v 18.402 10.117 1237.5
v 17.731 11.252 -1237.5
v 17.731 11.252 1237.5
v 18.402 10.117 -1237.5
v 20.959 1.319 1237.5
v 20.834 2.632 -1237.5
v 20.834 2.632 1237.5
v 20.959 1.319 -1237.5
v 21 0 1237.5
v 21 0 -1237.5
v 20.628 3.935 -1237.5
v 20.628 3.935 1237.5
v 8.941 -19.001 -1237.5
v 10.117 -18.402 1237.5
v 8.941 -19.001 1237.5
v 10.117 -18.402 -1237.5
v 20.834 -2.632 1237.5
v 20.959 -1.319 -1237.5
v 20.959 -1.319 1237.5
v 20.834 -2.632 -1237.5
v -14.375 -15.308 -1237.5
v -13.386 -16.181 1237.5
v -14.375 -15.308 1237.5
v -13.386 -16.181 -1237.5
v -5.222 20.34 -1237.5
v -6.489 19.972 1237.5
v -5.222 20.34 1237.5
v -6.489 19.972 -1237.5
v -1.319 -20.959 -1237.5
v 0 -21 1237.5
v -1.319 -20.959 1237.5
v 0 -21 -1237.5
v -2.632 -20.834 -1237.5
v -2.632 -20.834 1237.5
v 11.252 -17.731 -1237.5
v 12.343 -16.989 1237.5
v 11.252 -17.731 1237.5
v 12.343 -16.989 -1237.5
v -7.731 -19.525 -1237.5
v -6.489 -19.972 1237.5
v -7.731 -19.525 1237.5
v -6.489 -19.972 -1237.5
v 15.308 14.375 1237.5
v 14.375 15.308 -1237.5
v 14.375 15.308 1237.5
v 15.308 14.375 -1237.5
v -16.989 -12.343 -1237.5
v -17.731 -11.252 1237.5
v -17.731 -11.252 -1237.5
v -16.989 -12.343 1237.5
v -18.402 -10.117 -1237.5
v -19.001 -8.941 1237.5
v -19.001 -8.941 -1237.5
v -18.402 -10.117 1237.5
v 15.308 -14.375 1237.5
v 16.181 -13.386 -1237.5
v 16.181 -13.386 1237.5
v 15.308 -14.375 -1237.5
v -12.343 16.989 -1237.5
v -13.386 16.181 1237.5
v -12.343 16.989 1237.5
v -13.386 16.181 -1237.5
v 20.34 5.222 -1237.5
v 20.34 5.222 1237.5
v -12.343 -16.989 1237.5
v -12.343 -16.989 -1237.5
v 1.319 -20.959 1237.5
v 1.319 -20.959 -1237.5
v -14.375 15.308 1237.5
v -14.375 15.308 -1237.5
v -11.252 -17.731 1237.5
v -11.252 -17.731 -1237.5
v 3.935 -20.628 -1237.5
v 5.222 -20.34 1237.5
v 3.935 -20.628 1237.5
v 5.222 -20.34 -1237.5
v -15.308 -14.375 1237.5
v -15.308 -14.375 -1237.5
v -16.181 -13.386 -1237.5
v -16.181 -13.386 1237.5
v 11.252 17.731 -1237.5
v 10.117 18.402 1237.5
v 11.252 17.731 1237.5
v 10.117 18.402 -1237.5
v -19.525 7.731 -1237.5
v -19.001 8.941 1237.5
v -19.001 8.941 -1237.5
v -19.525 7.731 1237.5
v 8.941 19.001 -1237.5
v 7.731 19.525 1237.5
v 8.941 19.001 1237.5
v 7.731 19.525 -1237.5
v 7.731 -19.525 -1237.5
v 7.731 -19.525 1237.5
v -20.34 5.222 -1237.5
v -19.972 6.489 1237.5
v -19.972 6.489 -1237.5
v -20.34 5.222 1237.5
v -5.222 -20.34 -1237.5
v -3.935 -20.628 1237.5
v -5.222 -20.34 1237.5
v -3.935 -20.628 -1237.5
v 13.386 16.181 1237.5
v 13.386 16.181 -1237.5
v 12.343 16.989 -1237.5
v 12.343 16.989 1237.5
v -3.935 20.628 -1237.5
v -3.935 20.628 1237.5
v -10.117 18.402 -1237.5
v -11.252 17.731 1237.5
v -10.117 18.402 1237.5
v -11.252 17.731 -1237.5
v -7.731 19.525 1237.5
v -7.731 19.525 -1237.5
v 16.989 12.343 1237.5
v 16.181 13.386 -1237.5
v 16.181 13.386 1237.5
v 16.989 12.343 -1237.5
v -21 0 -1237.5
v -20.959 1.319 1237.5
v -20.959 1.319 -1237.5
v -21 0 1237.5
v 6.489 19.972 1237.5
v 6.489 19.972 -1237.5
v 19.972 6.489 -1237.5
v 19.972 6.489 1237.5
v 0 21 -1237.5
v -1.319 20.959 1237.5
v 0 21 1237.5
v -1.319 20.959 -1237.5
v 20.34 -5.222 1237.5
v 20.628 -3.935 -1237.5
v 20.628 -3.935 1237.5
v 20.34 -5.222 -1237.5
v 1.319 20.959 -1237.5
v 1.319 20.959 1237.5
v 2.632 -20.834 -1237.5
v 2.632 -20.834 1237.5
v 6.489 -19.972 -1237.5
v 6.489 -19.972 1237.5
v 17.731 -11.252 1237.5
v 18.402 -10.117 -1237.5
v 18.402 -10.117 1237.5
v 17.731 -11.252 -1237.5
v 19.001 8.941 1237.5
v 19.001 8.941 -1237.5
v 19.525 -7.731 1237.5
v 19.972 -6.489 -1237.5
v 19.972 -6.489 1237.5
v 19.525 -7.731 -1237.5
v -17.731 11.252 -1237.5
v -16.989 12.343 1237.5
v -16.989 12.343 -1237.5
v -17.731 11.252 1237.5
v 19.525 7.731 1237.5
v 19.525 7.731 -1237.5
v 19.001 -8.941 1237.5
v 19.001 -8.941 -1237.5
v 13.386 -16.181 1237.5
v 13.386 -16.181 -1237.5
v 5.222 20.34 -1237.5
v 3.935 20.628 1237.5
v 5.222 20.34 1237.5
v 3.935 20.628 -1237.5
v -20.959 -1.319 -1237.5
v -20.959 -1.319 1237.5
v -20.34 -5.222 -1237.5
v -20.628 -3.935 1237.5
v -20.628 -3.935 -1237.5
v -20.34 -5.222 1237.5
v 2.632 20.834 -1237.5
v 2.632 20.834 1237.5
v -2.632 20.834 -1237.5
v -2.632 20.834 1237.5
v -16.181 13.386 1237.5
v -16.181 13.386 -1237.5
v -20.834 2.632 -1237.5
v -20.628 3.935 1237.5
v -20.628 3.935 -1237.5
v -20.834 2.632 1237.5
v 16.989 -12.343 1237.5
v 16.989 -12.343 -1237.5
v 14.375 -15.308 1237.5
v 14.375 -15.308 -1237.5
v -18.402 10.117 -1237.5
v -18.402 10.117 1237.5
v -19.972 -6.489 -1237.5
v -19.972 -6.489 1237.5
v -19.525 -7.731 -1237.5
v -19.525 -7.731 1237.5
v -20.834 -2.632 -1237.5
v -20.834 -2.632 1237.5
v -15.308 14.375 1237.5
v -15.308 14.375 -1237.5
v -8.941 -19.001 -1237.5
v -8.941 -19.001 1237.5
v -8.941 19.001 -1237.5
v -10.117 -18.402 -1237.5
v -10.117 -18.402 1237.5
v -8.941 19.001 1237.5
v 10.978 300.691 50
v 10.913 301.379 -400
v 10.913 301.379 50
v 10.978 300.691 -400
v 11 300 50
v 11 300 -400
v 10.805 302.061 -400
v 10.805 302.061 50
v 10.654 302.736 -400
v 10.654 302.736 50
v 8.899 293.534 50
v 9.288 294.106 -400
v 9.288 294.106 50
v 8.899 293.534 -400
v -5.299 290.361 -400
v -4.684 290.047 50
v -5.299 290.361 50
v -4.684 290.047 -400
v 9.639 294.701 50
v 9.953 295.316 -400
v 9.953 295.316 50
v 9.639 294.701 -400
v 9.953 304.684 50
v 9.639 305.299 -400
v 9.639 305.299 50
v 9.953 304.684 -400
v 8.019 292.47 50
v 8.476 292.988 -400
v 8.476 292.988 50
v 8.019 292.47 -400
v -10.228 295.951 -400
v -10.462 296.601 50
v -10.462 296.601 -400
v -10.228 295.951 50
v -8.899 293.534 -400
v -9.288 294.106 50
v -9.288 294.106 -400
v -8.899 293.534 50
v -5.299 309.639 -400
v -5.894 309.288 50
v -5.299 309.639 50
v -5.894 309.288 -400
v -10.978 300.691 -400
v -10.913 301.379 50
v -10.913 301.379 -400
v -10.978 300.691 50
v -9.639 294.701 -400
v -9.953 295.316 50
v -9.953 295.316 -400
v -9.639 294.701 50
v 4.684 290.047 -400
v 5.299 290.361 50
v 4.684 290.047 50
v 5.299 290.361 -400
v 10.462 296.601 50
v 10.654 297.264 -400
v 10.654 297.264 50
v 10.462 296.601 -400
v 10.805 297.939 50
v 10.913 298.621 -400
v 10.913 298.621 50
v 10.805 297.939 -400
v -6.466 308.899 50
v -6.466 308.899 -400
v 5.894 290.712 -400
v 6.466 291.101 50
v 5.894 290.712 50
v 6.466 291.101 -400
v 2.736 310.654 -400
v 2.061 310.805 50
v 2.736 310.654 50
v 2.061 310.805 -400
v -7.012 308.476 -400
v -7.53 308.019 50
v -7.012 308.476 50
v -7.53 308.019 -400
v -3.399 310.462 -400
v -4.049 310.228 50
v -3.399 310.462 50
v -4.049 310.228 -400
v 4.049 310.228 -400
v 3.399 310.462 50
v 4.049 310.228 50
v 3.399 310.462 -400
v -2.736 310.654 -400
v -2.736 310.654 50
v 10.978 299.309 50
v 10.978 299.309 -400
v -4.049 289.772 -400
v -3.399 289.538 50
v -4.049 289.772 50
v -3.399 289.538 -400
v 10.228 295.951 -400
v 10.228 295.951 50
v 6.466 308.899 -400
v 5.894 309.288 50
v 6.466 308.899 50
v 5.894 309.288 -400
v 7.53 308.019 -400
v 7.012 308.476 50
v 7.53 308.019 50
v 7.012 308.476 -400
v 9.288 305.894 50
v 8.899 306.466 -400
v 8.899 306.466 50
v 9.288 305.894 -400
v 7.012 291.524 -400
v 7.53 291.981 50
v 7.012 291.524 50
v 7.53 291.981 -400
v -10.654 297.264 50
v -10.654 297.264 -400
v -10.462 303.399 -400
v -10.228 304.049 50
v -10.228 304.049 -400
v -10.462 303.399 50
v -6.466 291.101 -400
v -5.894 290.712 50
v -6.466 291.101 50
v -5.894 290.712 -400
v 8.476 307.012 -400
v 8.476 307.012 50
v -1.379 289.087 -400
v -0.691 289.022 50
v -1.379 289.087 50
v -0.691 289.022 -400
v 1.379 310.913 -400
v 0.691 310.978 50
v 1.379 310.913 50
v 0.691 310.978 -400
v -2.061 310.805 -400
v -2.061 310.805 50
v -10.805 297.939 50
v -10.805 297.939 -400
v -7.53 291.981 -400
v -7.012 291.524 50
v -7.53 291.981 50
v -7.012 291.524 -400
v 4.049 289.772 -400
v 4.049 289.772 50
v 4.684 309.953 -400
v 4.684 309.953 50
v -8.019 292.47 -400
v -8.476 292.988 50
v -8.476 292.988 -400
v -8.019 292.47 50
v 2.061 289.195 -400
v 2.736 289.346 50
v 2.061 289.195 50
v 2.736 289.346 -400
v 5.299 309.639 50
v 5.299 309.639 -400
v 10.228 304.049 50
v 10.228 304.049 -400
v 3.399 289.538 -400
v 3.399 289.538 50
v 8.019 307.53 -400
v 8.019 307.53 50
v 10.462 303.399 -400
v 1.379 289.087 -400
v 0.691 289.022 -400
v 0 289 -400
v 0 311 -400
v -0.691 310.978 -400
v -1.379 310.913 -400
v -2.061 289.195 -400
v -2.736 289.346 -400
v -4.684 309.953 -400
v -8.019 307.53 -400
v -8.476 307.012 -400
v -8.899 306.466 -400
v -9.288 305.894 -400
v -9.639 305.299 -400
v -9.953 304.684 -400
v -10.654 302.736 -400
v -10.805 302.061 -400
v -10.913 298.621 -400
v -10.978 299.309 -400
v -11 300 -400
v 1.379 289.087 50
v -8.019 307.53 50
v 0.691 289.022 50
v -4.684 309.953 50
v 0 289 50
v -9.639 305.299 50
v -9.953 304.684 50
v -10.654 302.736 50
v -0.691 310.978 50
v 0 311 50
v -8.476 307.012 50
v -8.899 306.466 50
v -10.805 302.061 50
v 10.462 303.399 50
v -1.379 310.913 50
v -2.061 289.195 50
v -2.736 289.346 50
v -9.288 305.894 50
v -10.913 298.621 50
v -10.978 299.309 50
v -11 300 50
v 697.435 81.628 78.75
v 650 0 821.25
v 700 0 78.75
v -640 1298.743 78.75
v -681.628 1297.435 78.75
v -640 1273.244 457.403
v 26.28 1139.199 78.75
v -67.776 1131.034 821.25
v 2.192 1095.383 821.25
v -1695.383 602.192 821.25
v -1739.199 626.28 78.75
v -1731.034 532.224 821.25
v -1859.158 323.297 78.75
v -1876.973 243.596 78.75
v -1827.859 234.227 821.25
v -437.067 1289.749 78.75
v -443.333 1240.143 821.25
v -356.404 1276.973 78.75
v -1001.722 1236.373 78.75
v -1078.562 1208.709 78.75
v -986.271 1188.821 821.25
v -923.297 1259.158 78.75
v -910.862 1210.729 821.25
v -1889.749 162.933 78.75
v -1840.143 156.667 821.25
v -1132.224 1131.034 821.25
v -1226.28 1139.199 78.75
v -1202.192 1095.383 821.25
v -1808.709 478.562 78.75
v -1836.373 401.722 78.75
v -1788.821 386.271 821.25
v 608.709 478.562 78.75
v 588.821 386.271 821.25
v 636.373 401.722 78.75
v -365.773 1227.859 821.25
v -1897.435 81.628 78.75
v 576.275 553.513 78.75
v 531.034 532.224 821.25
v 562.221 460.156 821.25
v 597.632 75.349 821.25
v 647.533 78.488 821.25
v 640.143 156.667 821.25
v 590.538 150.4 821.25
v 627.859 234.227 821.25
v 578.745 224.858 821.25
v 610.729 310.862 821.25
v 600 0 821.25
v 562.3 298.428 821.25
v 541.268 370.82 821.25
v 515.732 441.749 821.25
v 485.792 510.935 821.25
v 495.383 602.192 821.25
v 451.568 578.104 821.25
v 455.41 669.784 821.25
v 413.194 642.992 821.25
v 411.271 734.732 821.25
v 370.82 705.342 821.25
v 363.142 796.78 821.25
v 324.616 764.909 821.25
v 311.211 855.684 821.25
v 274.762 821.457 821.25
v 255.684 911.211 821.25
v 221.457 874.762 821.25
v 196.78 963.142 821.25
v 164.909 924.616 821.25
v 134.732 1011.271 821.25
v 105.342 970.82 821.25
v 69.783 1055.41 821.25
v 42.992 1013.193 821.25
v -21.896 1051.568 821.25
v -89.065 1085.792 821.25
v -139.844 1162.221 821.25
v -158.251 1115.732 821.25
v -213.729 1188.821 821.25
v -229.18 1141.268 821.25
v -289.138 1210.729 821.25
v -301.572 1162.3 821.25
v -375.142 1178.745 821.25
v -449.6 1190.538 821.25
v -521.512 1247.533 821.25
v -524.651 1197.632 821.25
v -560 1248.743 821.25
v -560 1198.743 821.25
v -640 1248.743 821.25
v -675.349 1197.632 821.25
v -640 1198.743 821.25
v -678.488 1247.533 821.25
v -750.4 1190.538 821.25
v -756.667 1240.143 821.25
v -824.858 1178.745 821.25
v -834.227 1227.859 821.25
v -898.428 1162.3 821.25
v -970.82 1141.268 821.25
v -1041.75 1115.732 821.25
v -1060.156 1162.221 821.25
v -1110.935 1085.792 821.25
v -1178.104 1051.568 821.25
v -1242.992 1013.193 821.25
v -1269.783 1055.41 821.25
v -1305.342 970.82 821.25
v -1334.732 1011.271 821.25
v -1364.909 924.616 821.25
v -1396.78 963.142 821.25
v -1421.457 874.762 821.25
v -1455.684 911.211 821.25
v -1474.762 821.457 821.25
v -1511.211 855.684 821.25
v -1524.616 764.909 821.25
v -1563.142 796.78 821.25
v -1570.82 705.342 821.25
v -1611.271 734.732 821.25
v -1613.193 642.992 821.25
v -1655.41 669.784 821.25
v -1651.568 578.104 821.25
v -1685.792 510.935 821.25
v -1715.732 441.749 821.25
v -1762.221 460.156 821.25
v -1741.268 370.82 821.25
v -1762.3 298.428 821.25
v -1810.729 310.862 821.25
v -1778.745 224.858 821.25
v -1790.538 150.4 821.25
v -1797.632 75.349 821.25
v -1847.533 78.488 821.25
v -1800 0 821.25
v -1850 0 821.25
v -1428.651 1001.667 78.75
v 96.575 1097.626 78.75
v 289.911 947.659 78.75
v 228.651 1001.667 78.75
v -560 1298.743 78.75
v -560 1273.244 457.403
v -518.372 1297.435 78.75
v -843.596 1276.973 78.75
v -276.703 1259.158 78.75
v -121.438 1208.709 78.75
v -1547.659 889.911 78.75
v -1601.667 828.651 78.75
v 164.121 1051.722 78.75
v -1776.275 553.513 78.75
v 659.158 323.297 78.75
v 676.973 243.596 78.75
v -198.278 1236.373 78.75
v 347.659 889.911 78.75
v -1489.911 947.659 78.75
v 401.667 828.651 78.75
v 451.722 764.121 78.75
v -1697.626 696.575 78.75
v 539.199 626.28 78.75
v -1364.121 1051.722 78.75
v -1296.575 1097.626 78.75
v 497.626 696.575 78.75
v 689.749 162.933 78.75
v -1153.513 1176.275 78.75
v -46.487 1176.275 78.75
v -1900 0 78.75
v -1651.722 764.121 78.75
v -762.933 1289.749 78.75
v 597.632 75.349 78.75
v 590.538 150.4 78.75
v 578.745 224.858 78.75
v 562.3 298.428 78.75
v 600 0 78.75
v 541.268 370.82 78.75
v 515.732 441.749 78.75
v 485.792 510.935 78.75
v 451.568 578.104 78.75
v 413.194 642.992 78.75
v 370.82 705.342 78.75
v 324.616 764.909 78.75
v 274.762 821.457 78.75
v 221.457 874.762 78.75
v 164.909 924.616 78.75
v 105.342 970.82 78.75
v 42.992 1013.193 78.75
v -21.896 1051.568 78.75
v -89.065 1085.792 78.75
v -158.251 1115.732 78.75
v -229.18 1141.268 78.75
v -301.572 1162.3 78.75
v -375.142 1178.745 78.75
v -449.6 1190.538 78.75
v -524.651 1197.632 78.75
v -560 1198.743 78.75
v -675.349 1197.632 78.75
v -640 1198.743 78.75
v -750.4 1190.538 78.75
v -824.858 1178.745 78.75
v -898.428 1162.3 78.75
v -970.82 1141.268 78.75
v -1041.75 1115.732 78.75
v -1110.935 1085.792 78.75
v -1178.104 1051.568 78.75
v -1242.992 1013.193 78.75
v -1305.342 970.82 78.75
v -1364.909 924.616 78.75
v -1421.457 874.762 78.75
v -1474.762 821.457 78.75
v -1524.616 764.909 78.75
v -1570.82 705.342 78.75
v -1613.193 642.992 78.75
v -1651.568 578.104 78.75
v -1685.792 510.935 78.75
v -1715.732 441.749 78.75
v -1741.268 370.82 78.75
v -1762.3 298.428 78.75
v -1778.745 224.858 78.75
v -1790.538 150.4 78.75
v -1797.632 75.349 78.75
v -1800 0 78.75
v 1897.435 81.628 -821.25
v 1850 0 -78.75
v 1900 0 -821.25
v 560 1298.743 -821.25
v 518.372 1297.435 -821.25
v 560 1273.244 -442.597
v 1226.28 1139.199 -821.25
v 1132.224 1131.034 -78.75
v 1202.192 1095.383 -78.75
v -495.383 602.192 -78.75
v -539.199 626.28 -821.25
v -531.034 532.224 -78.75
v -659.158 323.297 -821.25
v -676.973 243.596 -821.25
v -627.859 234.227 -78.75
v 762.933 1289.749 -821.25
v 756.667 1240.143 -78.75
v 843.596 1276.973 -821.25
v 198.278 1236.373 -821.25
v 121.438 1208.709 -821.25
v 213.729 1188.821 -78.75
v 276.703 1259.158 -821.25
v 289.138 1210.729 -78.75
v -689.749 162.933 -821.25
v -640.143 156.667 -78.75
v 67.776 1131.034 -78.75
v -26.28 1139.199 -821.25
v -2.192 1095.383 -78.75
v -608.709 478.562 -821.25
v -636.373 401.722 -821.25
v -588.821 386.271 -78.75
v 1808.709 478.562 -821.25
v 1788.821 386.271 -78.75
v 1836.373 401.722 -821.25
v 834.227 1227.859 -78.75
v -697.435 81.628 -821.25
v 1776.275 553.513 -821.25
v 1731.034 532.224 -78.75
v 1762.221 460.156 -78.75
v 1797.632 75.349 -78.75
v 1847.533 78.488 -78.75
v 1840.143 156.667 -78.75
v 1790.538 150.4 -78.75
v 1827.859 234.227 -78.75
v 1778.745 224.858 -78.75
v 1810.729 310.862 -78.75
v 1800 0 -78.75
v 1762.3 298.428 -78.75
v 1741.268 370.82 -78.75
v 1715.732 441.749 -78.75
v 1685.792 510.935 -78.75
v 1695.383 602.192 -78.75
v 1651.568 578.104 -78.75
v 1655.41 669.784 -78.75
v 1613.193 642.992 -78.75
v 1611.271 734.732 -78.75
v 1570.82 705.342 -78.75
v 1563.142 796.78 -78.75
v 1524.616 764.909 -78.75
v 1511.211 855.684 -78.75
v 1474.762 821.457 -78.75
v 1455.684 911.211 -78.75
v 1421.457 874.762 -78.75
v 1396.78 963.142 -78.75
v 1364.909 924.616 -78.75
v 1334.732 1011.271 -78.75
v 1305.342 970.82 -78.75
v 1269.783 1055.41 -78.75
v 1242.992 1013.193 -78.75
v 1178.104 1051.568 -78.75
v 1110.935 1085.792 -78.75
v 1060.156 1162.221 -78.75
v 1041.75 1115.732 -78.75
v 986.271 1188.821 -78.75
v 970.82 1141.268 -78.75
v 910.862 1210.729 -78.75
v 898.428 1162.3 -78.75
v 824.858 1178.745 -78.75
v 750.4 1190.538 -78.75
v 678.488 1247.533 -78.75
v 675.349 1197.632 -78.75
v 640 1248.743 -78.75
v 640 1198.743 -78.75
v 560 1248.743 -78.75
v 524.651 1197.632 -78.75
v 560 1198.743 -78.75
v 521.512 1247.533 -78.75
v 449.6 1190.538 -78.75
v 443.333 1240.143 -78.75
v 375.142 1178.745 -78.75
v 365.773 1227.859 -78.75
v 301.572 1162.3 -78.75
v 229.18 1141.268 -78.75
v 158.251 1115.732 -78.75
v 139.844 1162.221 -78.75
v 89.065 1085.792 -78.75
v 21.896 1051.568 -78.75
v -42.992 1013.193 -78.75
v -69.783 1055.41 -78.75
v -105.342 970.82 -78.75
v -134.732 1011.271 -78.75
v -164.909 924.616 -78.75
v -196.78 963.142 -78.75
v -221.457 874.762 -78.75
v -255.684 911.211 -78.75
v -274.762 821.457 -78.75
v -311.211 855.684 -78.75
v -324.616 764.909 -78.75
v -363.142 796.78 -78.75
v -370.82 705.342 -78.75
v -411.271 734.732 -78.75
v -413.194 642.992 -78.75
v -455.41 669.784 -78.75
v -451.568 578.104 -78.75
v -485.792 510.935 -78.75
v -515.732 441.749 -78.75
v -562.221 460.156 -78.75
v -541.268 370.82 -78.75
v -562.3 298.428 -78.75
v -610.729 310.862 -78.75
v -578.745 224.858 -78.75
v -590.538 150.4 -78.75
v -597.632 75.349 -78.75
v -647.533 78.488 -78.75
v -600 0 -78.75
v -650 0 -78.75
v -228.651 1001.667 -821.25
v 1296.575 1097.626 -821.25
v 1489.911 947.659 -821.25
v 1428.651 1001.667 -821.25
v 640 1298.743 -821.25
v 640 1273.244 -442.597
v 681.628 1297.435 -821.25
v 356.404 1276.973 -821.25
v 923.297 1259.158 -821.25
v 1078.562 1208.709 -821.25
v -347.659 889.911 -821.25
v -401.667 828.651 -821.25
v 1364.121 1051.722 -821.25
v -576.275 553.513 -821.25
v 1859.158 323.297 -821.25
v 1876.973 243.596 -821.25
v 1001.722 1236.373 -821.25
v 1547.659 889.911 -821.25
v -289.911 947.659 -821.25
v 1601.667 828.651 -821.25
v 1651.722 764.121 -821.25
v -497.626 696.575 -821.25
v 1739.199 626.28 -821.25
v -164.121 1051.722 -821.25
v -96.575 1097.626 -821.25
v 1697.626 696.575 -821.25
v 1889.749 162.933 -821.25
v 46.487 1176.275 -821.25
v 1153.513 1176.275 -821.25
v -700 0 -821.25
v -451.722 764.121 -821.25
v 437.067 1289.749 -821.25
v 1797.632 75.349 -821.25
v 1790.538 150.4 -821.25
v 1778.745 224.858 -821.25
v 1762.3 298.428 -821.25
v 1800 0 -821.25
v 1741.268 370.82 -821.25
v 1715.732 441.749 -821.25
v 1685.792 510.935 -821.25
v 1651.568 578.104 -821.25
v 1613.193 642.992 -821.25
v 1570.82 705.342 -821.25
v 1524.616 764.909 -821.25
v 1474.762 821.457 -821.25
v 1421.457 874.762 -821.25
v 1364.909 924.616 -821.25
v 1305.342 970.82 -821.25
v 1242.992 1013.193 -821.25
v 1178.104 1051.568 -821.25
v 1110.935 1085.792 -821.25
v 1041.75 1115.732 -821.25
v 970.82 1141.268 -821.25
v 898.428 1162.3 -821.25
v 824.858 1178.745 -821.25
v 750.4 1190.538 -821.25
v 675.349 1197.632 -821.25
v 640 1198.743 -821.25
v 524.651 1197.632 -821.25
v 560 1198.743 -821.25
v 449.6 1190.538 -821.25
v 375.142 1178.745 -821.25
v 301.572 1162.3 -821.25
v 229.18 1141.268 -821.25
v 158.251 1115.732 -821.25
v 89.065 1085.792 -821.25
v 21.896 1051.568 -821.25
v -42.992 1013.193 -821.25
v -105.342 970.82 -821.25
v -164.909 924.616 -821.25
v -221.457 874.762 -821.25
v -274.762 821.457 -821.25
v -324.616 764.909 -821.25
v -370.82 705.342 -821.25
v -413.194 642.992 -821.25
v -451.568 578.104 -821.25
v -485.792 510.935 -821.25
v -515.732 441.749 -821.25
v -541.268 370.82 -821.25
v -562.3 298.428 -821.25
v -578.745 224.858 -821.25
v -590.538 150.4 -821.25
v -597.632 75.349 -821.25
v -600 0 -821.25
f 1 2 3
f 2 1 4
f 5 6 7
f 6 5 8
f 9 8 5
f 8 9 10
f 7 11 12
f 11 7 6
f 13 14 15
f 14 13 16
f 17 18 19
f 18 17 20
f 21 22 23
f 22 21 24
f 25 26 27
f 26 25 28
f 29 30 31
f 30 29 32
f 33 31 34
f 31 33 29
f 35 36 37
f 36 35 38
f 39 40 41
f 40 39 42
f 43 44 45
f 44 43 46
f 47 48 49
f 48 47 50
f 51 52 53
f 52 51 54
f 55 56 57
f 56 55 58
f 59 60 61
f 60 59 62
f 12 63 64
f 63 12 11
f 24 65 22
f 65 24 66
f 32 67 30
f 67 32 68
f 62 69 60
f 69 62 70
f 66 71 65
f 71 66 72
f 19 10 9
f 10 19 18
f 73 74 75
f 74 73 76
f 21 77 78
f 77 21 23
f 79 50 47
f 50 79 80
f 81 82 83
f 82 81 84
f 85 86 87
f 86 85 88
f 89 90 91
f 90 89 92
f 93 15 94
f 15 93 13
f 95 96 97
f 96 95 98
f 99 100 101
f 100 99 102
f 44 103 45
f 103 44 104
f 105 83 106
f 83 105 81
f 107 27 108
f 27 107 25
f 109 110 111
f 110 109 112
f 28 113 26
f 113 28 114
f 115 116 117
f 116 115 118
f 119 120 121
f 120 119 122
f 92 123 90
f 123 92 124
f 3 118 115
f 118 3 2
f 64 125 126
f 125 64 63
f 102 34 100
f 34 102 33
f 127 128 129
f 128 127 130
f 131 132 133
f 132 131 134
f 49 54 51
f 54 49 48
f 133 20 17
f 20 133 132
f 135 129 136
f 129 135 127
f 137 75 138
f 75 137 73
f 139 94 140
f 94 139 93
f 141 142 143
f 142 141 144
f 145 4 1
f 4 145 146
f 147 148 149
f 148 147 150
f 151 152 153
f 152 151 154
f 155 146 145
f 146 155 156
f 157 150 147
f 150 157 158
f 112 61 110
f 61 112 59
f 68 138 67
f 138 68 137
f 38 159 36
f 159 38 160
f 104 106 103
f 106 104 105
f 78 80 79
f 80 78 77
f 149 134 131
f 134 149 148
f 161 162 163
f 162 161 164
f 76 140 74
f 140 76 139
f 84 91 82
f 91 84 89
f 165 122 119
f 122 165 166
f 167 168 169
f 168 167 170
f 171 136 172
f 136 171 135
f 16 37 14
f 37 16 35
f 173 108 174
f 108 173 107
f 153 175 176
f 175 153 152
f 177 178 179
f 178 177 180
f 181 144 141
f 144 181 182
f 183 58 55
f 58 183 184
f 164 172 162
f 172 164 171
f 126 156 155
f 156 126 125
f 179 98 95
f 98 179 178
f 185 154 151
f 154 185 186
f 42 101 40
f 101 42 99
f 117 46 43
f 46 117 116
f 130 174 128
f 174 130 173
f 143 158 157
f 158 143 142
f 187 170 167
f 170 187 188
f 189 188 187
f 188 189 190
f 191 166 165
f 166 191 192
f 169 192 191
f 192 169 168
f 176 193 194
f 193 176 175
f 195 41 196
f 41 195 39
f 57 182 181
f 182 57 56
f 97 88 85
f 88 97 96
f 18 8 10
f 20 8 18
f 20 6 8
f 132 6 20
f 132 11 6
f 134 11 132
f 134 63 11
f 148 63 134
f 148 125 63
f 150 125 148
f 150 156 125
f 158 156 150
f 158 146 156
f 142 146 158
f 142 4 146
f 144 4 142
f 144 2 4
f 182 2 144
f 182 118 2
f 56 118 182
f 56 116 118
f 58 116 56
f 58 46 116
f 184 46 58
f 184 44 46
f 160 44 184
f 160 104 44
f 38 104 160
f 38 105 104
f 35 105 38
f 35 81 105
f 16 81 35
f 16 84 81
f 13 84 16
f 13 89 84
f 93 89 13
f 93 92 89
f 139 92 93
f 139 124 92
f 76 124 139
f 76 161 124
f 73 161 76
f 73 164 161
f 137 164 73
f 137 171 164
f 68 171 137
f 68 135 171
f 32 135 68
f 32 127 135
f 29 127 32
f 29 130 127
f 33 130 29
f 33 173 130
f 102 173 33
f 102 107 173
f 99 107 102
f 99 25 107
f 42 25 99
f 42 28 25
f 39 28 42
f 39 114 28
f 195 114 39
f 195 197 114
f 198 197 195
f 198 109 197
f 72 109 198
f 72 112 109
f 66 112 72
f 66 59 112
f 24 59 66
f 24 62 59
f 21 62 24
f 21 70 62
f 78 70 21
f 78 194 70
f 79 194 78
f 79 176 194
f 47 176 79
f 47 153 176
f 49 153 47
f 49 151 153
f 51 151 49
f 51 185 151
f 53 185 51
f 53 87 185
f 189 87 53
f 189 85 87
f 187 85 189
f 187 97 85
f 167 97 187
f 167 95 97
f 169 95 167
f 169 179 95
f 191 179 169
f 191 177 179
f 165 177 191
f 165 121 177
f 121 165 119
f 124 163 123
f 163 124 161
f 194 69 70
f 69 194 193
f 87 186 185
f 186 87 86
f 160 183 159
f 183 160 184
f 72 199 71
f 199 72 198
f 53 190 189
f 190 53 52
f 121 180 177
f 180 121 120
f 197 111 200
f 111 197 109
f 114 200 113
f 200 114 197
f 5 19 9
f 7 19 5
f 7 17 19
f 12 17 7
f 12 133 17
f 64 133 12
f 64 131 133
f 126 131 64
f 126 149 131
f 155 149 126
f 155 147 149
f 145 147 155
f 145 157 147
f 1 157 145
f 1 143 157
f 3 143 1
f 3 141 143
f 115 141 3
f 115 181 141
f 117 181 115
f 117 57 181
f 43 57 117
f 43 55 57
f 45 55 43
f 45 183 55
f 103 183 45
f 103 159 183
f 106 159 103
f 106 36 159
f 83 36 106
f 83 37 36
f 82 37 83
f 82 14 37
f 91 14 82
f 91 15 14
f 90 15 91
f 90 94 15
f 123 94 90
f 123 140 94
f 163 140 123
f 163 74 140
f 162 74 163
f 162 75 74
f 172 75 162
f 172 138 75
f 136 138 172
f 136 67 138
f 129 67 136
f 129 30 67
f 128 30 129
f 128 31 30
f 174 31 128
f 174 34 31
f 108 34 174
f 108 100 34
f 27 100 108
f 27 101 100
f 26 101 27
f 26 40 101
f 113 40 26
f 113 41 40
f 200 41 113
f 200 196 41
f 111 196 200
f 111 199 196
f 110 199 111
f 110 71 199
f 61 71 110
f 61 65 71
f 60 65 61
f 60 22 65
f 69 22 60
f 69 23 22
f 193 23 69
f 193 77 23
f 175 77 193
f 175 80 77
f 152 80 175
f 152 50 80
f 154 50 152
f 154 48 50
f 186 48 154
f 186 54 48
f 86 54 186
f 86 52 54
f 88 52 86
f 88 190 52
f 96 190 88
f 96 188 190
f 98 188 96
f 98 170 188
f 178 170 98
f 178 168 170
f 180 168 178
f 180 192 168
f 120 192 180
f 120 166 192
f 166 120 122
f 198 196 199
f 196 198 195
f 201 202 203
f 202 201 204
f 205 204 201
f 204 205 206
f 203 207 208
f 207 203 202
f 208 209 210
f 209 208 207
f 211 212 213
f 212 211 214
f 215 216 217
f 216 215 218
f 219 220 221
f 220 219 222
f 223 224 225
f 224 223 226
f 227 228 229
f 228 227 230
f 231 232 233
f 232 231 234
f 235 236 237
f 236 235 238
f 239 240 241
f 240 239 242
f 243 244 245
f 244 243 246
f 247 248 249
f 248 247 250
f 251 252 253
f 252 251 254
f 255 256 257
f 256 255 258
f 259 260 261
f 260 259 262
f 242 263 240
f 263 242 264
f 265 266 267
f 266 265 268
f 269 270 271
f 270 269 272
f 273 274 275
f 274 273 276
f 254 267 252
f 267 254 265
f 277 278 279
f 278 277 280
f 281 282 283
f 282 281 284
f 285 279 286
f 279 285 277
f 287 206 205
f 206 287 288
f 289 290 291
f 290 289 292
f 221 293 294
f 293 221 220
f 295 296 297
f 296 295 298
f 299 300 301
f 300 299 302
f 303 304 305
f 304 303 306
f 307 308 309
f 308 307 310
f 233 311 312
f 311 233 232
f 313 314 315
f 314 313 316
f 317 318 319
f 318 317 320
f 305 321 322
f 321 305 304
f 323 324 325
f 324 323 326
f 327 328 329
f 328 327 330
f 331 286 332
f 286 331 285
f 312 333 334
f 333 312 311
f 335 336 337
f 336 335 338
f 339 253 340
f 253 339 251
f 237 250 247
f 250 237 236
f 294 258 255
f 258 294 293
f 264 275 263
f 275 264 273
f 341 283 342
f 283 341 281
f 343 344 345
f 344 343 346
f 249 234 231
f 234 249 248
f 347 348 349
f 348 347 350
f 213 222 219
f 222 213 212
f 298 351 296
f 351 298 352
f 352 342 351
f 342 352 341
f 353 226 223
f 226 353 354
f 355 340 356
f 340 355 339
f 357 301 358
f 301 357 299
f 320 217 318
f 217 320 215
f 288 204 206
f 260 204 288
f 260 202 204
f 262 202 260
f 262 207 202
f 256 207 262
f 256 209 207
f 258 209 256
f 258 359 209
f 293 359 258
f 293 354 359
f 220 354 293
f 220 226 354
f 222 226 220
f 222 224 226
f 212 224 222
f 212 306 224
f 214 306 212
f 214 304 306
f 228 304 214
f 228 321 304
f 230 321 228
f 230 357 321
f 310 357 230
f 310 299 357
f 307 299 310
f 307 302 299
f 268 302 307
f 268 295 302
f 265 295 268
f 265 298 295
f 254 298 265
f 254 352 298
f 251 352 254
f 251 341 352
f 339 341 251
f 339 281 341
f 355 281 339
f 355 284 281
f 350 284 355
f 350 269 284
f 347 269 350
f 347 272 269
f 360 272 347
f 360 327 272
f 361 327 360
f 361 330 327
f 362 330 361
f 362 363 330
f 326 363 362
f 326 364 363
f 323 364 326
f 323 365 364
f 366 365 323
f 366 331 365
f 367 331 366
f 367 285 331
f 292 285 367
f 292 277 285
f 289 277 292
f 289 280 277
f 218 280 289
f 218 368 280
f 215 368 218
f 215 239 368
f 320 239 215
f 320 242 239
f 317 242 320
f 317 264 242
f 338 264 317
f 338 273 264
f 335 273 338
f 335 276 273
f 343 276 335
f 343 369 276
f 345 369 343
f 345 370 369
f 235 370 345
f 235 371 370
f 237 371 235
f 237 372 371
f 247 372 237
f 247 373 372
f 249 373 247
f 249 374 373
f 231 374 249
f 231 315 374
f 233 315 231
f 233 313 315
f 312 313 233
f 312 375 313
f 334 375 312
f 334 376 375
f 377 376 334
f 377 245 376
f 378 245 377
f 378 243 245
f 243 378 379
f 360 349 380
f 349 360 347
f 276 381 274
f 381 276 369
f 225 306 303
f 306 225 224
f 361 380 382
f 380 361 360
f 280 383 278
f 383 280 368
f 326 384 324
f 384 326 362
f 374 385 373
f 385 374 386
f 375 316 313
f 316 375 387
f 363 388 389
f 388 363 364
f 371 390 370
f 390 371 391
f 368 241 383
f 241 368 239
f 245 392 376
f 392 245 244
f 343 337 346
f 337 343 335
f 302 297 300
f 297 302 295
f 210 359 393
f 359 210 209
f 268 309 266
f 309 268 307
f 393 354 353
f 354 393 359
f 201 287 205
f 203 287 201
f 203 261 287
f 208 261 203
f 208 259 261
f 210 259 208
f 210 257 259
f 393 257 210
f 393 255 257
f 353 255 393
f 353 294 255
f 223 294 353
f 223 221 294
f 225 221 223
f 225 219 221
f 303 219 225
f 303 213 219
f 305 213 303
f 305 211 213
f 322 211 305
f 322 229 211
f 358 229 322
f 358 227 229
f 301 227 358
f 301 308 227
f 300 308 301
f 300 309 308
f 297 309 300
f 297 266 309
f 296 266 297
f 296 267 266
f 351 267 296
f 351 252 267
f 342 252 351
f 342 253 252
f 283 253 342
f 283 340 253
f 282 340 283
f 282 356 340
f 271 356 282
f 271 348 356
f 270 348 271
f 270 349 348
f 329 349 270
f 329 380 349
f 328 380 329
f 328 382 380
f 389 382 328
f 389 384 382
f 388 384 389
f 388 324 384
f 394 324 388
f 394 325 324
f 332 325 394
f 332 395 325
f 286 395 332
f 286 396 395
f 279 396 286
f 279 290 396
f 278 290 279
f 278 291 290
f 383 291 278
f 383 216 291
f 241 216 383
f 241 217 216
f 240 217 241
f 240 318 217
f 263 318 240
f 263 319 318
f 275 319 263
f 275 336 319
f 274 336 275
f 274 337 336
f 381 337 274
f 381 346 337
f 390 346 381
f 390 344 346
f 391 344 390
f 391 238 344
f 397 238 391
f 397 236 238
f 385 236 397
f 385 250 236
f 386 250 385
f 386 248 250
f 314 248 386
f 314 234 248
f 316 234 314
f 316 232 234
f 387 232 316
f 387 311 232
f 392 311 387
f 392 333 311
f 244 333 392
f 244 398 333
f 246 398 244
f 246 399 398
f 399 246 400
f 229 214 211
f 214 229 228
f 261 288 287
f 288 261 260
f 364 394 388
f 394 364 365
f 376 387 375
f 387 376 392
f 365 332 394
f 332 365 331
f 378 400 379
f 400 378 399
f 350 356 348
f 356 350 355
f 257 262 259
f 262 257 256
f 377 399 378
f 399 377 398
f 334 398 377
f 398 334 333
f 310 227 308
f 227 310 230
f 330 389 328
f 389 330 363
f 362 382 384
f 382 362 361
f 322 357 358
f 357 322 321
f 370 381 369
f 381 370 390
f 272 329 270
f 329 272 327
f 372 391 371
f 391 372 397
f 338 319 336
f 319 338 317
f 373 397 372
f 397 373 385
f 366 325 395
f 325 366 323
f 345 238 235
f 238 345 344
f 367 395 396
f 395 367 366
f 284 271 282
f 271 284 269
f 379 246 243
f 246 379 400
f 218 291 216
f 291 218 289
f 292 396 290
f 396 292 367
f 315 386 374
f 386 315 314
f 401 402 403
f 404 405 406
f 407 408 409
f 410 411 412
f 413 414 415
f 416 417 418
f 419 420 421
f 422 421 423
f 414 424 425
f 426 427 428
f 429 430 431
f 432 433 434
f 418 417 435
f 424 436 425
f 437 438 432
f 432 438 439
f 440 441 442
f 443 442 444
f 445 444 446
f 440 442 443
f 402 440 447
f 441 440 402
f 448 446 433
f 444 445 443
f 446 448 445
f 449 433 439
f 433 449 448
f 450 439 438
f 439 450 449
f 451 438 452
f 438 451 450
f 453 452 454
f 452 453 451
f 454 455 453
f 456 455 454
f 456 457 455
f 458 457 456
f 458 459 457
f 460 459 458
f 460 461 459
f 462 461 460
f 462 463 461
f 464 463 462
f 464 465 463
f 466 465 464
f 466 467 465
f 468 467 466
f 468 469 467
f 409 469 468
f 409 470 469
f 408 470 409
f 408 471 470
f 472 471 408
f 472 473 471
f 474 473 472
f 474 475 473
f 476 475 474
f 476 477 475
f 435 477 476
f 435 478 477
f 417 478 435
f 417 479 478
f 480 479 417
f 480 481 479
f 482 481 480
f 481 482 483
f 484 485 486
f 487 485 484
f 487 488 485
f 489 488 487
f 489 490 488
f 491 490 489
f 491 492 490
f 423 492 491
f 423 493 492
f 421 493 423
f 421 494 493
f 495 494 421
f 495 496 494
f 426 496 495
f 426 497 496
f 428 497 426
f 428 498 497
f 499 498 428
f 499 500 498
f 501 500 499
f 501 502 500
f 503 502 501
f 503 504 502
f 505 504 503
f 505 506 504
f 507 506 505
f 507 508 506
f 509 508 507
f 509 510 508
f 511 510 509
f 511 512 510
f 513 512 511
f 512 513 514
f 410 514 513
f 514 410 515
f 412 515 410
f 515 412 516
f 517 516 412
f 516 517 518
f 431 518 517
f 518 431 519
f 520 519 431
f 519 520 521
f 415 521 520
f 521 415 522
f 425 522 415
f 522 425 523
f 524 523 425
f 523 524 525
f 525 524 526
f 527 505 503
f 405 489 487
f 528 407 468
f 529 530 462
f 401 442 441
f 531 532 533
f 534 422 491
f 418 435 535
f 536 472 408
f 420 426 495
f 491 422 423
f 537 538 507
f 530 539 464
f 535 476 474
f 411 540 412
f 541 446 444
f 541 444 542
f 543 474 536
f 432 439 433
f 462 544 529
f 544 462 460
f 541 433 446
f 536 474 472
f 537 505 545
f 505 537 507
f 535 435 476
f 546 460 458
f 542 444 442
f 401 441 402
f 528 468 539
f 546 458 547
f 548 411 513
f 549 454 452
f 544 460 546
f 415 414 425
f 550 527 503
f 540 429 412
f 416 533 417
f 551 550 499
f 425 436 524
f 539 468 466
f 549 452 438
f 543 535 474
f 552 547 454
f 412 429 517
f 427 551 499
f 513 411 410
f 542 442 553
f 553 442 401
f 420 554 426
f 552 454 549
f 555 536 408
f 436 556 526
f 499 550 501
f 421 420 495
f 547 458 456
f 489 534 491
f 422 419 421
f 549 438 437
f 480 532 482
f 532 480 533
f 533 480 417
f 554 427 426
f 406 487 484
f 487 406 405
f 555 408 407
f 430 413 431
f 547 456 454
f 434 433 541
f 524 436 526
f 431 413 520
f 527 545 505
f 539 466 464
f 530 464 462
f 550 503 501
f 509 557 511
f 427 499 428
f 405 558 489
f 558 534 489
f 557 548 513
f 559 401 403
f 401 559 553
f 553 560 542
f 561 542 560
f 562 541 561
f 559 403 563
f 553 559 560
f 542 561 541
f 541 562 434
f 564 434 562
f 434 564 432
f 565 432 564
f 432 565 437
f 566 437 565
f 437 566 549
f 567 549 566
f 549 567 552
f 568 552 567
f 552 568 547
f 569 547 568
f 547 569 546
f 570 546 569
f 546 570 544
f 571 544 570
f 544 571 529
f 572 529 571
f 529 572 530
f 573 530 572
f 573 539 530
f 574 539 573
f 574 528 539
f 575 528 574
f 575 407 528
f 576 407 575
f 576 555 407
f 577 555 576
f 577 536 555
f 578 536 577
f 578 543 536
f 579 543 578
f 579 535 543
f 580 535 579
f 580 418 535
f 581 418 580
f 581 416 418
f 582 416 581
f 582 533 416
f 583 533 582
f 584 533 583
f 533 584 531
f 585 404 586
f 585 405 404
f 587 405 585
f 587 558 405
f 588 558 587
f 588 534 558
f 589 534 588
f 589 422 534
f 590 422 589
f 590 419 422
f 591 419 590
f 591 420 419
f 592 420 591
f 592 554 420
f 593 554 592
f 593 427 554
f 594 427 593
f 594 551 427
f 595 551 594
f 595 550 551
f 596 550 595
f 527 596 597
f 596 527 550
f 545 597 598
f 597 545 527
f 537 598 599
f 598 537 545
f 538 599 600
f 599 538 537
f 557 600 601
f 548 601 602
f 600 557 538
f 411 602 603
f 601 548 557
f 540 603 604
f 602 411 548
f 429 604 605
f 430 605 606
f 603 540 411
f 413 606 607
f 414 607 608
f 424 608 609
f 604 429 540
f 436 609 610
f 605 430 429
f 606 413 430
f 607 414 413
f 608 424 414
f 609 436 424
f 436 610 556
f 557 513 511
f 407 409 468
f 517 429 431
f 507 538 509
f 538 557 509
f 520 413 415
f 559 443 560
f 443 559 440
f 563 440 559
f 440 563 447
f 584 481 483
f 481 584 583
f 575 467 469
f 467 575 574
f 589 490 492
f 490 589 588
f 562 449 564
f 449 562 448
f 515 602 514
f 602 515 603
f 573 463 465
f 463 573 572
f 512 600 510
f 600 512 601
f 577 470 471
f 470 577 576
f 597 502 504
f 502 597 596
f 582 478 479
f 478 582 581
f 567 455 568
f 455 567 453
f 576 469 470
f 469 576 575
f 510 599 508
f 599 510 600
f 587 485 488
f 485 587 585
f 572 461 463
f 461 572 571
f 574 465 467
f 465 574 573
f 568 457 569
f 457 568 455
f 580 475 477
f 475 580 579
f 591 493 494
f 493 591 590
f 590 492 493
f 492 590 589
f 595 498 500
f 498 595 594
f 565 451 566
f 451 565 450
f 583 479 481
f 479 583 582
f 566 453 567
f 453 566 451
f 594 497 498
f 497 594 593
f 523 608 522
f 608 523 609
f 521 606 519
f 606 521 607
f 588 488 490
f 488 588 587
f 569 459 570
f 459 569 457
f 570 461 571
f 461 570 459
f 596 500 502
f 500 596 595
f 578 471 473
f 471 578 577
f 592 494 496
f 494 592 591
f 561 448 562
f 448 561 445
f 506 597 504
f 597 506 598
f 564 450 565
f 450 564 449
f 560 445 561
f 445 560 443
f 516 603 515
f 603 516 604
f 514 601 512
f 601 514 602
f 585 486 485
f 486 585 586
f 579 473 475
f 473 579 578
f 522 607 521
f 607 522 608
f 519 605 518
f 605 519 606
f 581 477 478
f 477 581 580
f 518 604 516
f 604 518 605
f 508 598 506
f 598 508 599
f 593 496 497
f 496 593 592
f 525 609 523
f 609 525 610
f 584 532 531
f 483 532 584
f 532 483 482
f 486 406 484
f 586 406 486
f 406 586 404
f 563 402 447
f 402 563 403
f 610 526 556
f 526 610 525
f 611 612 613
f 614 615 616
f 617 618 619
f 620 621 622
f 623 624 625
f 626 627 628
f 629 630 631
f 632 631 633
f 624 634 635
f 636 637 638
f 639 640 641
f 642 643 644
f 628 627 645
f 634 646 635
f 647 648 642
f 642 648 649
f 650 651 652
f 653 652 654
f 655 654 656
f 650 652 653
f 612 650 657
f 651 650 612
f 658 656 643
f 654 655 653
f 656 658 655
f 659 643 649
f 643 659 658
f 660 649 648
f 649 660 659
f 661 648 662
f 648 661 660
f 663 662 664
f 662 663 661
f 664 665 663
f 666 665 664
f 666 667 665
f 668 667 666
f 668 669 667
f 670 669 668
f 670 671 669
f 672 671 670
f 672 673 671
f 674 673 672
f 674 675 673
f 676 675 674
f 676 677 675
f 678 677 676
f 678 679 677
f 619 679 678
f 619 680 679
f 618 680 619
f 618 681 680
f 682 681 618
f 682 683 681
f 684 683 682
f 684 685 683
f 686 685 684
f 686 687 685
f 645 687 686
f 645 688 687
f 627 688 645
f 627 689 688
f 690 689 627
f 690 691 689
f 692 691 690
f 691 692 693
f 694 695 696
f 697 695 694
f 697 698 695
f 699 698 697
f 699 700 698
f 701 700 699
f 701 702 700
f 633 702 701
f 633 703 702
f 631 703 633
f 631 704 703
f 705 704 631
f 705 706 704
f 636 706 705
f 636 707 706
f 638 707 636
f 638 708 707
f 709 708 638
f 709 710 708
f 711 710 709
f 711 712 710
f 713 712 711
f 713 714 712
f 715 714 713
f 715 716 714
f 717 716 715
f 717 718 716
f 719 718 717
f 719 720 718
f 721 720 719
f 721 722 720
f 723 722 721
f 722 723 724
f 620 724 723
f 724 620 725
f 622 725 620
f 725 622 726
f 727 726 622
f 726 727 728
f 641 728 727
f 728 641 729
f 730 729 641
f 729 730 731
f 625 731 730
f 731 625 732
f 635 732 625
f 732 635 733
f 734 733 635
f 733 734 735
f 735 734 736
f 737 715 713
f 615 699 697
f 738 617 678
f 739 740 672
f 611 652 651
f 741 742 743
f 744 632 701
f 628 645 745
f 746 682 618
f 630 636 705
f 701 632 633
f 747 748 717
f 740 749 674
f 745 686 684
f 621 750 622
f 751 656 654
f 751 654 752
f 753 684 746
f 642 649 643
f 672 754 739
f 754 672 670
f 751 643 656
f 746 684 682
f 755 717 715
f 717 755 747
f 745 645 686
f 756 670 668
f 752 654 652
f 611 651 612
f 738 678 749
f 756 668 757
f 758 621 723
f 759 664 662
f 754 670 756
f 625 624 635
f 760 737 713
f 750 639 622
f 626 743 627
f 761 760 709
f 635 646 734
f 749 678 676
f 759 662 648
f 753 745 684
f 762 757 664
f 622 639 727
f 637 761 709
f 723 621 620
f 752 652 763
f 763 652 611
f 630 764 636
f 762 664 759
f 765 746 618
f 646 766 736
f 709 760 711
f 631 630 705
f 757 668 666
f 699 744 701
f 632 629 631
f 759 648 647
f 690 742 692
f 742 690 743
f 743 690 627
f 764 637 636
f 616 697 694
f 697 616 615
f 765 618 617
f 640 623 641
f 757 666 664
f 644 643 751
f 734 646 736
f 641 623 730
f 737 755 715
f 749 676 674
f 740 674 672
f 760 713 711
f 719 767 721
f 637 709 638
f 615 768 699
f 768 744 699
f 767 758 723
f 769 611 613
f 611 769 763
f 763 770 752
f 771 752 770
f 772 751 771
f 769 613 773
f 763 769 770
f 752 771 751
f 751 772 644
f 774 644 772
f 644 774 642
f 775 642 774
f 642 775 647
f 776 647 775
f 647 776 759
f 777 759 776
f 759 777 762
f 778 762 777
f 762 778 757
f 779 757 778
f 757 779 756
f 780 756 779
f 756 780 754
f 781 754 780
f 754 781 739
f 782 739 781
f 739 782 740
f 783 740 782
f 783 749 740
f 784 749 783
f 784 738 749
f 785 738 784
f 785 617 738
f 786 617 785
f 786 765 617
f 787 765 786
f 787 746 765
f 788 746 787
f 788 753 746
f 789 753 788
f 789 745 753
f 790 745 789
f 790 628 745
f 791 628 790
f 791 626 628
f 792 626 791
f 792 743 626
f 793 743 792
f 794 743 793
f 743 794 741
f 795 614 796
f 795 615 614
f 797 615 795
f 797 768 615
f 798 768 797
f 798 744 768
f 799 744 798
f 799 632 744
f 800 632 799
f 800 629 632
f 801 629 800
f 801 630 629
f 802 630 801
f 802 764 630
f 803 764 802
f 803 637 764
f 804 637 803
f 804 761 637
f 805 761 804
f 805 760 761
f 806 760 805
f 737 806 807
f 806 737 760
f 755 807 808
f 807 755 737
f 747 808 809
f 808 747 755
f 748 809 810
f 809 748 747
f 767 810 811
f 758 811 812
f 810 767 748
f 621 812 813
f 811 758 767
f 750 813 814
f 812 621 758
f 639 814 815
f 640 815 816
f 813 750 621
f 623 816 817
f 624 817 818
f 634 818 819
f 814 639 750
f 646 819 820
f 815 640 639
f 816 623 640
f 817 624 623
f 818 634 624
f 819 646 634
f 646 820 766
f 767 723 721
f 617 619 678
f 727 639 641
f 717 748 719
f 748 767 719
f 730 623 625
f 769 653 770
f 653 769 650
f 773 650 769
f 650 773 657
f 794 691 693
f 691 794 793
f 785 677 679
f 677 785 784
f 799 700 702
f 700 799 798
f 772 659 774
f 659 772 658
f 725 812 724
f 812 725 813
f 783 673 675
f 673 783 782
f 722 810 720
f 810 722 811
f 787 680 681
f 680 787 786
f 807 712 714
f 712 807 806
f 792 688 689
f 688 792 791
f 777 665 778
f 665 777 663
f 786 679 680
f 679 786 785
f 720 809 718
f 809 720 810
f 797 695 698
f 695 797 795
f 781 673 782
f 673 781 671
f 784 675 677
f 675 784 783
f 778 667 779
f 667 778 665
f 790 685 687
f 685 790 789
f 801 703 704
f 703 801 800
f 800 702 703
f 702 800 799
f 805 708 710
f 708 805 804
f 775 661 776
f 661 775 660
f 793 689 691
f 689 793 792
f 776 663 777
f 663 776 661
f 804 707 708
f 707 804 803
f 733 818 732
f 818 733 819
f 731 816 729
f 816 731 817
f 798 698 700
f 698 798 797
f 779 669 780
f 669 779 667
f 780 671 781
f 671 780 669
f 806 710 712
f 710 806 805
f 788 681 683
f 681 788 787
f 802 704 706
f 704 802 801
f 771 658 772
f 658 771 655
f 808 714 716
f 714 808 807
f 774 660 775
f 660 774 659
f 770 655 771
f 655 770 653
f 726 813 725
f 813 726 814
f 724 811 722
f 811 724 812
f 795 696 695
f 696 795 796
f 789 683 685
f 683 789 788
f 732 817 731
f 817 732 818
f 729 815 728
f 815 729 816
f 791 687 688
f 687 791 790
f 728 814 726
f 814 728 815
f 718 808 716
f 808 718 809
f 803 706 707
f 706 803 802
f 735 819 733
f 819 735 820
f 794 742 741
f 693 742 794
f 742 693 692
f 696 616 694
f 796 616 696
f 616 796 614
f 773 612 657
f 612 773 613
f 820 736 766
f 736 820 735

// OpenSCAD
// ============================================================================
// PROJECT: XXXG-00W0 WING GUNDAM ZERO EW - COCKPIT DOCKING MATRIX
// COMPONENT VAULT: BANDAI CAST RUNNER C - COCKPIT HATCH FRAMES C1 & C2
// PACKAGING RE-ARCHITECTURE: SUB-ARMOR CAPACITOR RECESSED BANK INTEGRATION
// CONFIG METRIC: SCALED TITANIUM CASTS (1:1 ACTUAL METRIC UP-SCALE)
// ============================================================================

$fn = 100; // Circular segment rendering resolution count

// Structural Constants Scaled 1:1 for a 16.7-Meter Airframe Scale (mm)
hatch_frame_length = 1650;               // Total longitudinal vertical height (mm)
hatch_outer_diameter = 2500;             // Outer clear track bounding width (mm)
armor_skin_thickness = 50;              // Solid TiAl protective plating wall (mm)
harness_conduit_width = 80;             // Cast-in 4oz copper logic trace track (mm)
capacitor_pocket_depth = 15;            // Sub-armor recessed housing pocket depth (mm)
capacitor_pocket_width = 140;           // Transverse MLCC array pocket width (mm)

module Runner_C_Chest_Hatch_Forge() {
    // Central Supply Injection Runner Axis (Molten Feed Line from Siphon Forge)
    color([0.22, 0.22, 0.24]) {
        cylinder(h = hatch_frame_length * 1.5, d = 42, center = true);
        // Direct injection gates tracking straight into the part mold cavities
        translate() rotate() cylinder(h = 450, d = 22);
        translate([0, 300, -400]) rotate() cylinder(h = 450, d = 22);
    }
    
    // Instantiate Scaled Skeutomorphic Part Molds Symmetrically (Left & Right)
    Cast_Outer_Hatch_Frames();
}

module Cast_Outer_Hatch_Frames() {
    // ---- PART C1: UPPER TORSO CHEST COLLAR EXTENSION (LEFT HATCH FRAME) ---- [Page 5, Step 02-1]
    translate([-600, 0, 450]) color([0.2, 0.4, 0.8]) { // Cobalt Blue Accent Spec
        difference() {
            // Main solid heavy-duty cockpit access enclosure framing block
            cylinder(h = hatch_frame_length * 0.45, d1 = hatch_outer_diameter + 100, d2 = hatch_outer_diameter, center = true);
            
            // Core internal channel boring (Fits securely over the 2400mm cockpit cylinder pod outer wall)
            cylinder(h = hatch_frame_length * 0.5, d = 2400, center = true);
            
            // SUB-ARMOR RECESSED CAPACITOR POCKETS [Segmented rows cut inside the frame walls]
            for (z_offset = [-250, 0, 250]) {
                translate([0, (2400/2 - armor_skin_thickness + capacitor_pocket_depth/2), z_offset])
                    cube([capacitor_pocket_width, capacitor_pocket_depth, 120], center = true);
            }
            
            // Continuous cast-in routing track for the 4oz solid-state wiring rails
            cube([harness_conduit_width, hatch_outer_diameter + 120, hatch_frame_length], center = true);
            
            // Slicing profile tool to generate an asymmetrical half-shell part component
            translate([0, -hatch_outer_diameter, 0])
                cube([hatch_outer_diameter * 2, hatch_outer_diameter * 2, hatch_frame_length * 2], center = true);
        }
    }
    
    // ---- PART C2: UPPER TORSO CHEST COLLAR EXTENSION (RIGHT HATCH FRAME) ---- [Page 5, Step 02-1]
    translate([600, 0, -450]) rotate() color([0.2, 0.4, 0.8]) {
        difference() {
            cylinder(h = hatch_frame_length * 0.45, d1 = hatch_outer_diameter + 100, d2 = hatch_outer_diameter, center = true);
            cylinder(h = hatch_frame_length * 0.5, d = 2400, center = true);
            
            for (z_offset = [-250, 0, 250]) {
                translate([0, (2400/2 - armor_skin_thickness + capacitor_pocket_depth/2), z_offset])
                    cube([capacitor_pocket_width, capacitor_pocket_depth, 120], center = true);
            }
            
            cube([harness_conduit_width, hatch_outer_diameter + 120, hatch_frame_length], center = true);
            translate([0, -hatch_outer_diameter, 0])
                cube([hatch_outer_diameter * 2, hatch_outer_diameter * 2, hatch_frame_length * 2], center = true);
        }
    }
}

// Render Master Assembly to Parameter Workspace
Runner_C_Chest_Hatch_Forge();
